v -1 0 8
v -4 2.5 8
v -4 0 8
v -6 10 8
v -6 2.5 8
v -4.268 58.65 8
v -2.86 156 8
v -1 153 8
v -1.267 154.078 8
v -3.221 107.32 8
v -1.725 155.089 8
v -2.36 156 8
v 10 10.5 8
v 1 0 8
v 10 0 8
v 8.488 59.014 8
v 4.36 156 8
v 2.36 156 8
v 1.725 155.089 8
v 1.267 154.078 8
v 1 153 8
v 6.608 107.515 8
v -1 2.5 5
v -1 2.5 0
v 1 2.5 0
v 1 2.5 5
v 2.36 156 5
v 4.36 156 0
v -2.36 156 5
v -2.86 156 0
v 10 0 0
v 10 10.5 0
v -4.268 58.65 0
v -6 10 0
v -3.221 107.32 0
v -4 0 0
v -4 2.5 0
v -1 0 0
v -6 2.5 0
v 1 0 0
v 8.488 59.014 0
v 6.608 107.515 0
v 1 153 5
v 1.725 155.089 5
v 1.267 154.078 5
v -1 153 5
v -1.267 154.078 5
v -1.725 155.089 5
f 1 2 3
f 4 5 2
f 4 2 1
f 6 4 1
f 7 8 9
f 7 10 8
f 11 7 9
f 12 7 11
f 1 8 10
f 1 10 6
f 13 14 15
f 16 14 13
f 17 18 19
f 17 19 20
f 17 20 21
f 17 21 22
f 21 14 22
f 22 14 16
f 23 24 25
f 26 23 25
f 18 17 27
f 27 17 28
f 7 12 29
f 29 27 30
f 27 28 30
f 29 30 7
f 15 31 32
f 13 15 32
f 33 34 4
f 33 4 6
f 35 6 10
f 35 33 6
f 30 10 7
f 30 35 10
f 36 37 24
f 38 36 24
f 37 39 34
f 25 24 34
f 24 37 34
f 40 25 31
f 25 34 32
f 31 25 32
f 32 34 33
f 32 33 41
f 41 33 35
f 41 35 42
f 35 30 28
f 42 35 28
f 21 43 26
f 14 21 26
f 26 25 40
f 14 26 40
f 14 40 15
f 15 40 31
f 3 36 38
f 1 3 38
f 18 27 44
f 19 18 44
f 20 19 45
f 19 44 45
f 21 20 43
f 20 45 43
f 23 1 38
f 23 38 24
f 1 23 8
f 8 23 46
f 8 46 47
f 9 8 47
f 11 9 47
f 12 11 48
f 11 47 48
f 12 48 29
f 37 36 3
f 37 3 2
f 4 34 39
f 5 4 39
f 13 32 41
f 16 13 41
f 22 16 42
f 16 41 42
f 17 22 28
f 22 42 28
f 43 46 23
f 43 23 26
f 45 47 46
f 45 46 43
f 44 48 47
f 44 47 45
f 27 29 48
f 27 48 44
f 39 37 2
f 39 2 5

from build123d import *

# Parameters (mm, degrees)
PAD_DEPTH    = 8
SKETCH_W     = 4.72
SKETCH_H     = 153.5
PAD001_DEPTH = 5
PAD003_DEPTH = 8


with BuildPart() as part:
    # Sketch003 → Pad (new body)
    with BuildSketch(Plane.XY):
        with BuildLine():
            Line((-1, 0), (-1, 153))
            ThreePointArc((-1, 153), (-1.472972, 154.593853), (-2.36, 156))
            Line((-2.36, 156), (-2.86, 156))
            ThreePointArc((-6, 10), (-3.658792, 82.983414), (-2.86, 156))
            Line((-6, 10), (-6, 2.5))
            Line((-4, 2.5), (-6, 2.5))
            Line((-4, 0), (-4, 2.5))
            Line((-4, 0), (-1, 0))
        make_face()
    extrude(amount=PAD_DEPTH)

    # Sketch → Pad001 (join)
    with BuildSketch(Plane.XY):
        with Locations((0, 79.25)):
            Rectangle(SKETCH_W, SKETCH_H)
    extrude(amount=PAD001_DEPTH)

    # Sketch011 → Pad003 (join)
    with BuildSketch(Plane.XY):
        with BuildLine():
            Line((1, 0), (10, 0))
            Line((10, 0), (10, 10.5))
            ThreePointArc((10, 10.5), (7.593861, 83.266042), (4.36, 156))
            Line((4.36, 156), (2.36, 156))
            ThreePointArc((2.36, 156), (1.472972, 154.593853), (1, 153))
            Line((1, 153), (1, 0))
        make_face()
    extrude(amount=PAD003_DEPTH)


solid = part.part
